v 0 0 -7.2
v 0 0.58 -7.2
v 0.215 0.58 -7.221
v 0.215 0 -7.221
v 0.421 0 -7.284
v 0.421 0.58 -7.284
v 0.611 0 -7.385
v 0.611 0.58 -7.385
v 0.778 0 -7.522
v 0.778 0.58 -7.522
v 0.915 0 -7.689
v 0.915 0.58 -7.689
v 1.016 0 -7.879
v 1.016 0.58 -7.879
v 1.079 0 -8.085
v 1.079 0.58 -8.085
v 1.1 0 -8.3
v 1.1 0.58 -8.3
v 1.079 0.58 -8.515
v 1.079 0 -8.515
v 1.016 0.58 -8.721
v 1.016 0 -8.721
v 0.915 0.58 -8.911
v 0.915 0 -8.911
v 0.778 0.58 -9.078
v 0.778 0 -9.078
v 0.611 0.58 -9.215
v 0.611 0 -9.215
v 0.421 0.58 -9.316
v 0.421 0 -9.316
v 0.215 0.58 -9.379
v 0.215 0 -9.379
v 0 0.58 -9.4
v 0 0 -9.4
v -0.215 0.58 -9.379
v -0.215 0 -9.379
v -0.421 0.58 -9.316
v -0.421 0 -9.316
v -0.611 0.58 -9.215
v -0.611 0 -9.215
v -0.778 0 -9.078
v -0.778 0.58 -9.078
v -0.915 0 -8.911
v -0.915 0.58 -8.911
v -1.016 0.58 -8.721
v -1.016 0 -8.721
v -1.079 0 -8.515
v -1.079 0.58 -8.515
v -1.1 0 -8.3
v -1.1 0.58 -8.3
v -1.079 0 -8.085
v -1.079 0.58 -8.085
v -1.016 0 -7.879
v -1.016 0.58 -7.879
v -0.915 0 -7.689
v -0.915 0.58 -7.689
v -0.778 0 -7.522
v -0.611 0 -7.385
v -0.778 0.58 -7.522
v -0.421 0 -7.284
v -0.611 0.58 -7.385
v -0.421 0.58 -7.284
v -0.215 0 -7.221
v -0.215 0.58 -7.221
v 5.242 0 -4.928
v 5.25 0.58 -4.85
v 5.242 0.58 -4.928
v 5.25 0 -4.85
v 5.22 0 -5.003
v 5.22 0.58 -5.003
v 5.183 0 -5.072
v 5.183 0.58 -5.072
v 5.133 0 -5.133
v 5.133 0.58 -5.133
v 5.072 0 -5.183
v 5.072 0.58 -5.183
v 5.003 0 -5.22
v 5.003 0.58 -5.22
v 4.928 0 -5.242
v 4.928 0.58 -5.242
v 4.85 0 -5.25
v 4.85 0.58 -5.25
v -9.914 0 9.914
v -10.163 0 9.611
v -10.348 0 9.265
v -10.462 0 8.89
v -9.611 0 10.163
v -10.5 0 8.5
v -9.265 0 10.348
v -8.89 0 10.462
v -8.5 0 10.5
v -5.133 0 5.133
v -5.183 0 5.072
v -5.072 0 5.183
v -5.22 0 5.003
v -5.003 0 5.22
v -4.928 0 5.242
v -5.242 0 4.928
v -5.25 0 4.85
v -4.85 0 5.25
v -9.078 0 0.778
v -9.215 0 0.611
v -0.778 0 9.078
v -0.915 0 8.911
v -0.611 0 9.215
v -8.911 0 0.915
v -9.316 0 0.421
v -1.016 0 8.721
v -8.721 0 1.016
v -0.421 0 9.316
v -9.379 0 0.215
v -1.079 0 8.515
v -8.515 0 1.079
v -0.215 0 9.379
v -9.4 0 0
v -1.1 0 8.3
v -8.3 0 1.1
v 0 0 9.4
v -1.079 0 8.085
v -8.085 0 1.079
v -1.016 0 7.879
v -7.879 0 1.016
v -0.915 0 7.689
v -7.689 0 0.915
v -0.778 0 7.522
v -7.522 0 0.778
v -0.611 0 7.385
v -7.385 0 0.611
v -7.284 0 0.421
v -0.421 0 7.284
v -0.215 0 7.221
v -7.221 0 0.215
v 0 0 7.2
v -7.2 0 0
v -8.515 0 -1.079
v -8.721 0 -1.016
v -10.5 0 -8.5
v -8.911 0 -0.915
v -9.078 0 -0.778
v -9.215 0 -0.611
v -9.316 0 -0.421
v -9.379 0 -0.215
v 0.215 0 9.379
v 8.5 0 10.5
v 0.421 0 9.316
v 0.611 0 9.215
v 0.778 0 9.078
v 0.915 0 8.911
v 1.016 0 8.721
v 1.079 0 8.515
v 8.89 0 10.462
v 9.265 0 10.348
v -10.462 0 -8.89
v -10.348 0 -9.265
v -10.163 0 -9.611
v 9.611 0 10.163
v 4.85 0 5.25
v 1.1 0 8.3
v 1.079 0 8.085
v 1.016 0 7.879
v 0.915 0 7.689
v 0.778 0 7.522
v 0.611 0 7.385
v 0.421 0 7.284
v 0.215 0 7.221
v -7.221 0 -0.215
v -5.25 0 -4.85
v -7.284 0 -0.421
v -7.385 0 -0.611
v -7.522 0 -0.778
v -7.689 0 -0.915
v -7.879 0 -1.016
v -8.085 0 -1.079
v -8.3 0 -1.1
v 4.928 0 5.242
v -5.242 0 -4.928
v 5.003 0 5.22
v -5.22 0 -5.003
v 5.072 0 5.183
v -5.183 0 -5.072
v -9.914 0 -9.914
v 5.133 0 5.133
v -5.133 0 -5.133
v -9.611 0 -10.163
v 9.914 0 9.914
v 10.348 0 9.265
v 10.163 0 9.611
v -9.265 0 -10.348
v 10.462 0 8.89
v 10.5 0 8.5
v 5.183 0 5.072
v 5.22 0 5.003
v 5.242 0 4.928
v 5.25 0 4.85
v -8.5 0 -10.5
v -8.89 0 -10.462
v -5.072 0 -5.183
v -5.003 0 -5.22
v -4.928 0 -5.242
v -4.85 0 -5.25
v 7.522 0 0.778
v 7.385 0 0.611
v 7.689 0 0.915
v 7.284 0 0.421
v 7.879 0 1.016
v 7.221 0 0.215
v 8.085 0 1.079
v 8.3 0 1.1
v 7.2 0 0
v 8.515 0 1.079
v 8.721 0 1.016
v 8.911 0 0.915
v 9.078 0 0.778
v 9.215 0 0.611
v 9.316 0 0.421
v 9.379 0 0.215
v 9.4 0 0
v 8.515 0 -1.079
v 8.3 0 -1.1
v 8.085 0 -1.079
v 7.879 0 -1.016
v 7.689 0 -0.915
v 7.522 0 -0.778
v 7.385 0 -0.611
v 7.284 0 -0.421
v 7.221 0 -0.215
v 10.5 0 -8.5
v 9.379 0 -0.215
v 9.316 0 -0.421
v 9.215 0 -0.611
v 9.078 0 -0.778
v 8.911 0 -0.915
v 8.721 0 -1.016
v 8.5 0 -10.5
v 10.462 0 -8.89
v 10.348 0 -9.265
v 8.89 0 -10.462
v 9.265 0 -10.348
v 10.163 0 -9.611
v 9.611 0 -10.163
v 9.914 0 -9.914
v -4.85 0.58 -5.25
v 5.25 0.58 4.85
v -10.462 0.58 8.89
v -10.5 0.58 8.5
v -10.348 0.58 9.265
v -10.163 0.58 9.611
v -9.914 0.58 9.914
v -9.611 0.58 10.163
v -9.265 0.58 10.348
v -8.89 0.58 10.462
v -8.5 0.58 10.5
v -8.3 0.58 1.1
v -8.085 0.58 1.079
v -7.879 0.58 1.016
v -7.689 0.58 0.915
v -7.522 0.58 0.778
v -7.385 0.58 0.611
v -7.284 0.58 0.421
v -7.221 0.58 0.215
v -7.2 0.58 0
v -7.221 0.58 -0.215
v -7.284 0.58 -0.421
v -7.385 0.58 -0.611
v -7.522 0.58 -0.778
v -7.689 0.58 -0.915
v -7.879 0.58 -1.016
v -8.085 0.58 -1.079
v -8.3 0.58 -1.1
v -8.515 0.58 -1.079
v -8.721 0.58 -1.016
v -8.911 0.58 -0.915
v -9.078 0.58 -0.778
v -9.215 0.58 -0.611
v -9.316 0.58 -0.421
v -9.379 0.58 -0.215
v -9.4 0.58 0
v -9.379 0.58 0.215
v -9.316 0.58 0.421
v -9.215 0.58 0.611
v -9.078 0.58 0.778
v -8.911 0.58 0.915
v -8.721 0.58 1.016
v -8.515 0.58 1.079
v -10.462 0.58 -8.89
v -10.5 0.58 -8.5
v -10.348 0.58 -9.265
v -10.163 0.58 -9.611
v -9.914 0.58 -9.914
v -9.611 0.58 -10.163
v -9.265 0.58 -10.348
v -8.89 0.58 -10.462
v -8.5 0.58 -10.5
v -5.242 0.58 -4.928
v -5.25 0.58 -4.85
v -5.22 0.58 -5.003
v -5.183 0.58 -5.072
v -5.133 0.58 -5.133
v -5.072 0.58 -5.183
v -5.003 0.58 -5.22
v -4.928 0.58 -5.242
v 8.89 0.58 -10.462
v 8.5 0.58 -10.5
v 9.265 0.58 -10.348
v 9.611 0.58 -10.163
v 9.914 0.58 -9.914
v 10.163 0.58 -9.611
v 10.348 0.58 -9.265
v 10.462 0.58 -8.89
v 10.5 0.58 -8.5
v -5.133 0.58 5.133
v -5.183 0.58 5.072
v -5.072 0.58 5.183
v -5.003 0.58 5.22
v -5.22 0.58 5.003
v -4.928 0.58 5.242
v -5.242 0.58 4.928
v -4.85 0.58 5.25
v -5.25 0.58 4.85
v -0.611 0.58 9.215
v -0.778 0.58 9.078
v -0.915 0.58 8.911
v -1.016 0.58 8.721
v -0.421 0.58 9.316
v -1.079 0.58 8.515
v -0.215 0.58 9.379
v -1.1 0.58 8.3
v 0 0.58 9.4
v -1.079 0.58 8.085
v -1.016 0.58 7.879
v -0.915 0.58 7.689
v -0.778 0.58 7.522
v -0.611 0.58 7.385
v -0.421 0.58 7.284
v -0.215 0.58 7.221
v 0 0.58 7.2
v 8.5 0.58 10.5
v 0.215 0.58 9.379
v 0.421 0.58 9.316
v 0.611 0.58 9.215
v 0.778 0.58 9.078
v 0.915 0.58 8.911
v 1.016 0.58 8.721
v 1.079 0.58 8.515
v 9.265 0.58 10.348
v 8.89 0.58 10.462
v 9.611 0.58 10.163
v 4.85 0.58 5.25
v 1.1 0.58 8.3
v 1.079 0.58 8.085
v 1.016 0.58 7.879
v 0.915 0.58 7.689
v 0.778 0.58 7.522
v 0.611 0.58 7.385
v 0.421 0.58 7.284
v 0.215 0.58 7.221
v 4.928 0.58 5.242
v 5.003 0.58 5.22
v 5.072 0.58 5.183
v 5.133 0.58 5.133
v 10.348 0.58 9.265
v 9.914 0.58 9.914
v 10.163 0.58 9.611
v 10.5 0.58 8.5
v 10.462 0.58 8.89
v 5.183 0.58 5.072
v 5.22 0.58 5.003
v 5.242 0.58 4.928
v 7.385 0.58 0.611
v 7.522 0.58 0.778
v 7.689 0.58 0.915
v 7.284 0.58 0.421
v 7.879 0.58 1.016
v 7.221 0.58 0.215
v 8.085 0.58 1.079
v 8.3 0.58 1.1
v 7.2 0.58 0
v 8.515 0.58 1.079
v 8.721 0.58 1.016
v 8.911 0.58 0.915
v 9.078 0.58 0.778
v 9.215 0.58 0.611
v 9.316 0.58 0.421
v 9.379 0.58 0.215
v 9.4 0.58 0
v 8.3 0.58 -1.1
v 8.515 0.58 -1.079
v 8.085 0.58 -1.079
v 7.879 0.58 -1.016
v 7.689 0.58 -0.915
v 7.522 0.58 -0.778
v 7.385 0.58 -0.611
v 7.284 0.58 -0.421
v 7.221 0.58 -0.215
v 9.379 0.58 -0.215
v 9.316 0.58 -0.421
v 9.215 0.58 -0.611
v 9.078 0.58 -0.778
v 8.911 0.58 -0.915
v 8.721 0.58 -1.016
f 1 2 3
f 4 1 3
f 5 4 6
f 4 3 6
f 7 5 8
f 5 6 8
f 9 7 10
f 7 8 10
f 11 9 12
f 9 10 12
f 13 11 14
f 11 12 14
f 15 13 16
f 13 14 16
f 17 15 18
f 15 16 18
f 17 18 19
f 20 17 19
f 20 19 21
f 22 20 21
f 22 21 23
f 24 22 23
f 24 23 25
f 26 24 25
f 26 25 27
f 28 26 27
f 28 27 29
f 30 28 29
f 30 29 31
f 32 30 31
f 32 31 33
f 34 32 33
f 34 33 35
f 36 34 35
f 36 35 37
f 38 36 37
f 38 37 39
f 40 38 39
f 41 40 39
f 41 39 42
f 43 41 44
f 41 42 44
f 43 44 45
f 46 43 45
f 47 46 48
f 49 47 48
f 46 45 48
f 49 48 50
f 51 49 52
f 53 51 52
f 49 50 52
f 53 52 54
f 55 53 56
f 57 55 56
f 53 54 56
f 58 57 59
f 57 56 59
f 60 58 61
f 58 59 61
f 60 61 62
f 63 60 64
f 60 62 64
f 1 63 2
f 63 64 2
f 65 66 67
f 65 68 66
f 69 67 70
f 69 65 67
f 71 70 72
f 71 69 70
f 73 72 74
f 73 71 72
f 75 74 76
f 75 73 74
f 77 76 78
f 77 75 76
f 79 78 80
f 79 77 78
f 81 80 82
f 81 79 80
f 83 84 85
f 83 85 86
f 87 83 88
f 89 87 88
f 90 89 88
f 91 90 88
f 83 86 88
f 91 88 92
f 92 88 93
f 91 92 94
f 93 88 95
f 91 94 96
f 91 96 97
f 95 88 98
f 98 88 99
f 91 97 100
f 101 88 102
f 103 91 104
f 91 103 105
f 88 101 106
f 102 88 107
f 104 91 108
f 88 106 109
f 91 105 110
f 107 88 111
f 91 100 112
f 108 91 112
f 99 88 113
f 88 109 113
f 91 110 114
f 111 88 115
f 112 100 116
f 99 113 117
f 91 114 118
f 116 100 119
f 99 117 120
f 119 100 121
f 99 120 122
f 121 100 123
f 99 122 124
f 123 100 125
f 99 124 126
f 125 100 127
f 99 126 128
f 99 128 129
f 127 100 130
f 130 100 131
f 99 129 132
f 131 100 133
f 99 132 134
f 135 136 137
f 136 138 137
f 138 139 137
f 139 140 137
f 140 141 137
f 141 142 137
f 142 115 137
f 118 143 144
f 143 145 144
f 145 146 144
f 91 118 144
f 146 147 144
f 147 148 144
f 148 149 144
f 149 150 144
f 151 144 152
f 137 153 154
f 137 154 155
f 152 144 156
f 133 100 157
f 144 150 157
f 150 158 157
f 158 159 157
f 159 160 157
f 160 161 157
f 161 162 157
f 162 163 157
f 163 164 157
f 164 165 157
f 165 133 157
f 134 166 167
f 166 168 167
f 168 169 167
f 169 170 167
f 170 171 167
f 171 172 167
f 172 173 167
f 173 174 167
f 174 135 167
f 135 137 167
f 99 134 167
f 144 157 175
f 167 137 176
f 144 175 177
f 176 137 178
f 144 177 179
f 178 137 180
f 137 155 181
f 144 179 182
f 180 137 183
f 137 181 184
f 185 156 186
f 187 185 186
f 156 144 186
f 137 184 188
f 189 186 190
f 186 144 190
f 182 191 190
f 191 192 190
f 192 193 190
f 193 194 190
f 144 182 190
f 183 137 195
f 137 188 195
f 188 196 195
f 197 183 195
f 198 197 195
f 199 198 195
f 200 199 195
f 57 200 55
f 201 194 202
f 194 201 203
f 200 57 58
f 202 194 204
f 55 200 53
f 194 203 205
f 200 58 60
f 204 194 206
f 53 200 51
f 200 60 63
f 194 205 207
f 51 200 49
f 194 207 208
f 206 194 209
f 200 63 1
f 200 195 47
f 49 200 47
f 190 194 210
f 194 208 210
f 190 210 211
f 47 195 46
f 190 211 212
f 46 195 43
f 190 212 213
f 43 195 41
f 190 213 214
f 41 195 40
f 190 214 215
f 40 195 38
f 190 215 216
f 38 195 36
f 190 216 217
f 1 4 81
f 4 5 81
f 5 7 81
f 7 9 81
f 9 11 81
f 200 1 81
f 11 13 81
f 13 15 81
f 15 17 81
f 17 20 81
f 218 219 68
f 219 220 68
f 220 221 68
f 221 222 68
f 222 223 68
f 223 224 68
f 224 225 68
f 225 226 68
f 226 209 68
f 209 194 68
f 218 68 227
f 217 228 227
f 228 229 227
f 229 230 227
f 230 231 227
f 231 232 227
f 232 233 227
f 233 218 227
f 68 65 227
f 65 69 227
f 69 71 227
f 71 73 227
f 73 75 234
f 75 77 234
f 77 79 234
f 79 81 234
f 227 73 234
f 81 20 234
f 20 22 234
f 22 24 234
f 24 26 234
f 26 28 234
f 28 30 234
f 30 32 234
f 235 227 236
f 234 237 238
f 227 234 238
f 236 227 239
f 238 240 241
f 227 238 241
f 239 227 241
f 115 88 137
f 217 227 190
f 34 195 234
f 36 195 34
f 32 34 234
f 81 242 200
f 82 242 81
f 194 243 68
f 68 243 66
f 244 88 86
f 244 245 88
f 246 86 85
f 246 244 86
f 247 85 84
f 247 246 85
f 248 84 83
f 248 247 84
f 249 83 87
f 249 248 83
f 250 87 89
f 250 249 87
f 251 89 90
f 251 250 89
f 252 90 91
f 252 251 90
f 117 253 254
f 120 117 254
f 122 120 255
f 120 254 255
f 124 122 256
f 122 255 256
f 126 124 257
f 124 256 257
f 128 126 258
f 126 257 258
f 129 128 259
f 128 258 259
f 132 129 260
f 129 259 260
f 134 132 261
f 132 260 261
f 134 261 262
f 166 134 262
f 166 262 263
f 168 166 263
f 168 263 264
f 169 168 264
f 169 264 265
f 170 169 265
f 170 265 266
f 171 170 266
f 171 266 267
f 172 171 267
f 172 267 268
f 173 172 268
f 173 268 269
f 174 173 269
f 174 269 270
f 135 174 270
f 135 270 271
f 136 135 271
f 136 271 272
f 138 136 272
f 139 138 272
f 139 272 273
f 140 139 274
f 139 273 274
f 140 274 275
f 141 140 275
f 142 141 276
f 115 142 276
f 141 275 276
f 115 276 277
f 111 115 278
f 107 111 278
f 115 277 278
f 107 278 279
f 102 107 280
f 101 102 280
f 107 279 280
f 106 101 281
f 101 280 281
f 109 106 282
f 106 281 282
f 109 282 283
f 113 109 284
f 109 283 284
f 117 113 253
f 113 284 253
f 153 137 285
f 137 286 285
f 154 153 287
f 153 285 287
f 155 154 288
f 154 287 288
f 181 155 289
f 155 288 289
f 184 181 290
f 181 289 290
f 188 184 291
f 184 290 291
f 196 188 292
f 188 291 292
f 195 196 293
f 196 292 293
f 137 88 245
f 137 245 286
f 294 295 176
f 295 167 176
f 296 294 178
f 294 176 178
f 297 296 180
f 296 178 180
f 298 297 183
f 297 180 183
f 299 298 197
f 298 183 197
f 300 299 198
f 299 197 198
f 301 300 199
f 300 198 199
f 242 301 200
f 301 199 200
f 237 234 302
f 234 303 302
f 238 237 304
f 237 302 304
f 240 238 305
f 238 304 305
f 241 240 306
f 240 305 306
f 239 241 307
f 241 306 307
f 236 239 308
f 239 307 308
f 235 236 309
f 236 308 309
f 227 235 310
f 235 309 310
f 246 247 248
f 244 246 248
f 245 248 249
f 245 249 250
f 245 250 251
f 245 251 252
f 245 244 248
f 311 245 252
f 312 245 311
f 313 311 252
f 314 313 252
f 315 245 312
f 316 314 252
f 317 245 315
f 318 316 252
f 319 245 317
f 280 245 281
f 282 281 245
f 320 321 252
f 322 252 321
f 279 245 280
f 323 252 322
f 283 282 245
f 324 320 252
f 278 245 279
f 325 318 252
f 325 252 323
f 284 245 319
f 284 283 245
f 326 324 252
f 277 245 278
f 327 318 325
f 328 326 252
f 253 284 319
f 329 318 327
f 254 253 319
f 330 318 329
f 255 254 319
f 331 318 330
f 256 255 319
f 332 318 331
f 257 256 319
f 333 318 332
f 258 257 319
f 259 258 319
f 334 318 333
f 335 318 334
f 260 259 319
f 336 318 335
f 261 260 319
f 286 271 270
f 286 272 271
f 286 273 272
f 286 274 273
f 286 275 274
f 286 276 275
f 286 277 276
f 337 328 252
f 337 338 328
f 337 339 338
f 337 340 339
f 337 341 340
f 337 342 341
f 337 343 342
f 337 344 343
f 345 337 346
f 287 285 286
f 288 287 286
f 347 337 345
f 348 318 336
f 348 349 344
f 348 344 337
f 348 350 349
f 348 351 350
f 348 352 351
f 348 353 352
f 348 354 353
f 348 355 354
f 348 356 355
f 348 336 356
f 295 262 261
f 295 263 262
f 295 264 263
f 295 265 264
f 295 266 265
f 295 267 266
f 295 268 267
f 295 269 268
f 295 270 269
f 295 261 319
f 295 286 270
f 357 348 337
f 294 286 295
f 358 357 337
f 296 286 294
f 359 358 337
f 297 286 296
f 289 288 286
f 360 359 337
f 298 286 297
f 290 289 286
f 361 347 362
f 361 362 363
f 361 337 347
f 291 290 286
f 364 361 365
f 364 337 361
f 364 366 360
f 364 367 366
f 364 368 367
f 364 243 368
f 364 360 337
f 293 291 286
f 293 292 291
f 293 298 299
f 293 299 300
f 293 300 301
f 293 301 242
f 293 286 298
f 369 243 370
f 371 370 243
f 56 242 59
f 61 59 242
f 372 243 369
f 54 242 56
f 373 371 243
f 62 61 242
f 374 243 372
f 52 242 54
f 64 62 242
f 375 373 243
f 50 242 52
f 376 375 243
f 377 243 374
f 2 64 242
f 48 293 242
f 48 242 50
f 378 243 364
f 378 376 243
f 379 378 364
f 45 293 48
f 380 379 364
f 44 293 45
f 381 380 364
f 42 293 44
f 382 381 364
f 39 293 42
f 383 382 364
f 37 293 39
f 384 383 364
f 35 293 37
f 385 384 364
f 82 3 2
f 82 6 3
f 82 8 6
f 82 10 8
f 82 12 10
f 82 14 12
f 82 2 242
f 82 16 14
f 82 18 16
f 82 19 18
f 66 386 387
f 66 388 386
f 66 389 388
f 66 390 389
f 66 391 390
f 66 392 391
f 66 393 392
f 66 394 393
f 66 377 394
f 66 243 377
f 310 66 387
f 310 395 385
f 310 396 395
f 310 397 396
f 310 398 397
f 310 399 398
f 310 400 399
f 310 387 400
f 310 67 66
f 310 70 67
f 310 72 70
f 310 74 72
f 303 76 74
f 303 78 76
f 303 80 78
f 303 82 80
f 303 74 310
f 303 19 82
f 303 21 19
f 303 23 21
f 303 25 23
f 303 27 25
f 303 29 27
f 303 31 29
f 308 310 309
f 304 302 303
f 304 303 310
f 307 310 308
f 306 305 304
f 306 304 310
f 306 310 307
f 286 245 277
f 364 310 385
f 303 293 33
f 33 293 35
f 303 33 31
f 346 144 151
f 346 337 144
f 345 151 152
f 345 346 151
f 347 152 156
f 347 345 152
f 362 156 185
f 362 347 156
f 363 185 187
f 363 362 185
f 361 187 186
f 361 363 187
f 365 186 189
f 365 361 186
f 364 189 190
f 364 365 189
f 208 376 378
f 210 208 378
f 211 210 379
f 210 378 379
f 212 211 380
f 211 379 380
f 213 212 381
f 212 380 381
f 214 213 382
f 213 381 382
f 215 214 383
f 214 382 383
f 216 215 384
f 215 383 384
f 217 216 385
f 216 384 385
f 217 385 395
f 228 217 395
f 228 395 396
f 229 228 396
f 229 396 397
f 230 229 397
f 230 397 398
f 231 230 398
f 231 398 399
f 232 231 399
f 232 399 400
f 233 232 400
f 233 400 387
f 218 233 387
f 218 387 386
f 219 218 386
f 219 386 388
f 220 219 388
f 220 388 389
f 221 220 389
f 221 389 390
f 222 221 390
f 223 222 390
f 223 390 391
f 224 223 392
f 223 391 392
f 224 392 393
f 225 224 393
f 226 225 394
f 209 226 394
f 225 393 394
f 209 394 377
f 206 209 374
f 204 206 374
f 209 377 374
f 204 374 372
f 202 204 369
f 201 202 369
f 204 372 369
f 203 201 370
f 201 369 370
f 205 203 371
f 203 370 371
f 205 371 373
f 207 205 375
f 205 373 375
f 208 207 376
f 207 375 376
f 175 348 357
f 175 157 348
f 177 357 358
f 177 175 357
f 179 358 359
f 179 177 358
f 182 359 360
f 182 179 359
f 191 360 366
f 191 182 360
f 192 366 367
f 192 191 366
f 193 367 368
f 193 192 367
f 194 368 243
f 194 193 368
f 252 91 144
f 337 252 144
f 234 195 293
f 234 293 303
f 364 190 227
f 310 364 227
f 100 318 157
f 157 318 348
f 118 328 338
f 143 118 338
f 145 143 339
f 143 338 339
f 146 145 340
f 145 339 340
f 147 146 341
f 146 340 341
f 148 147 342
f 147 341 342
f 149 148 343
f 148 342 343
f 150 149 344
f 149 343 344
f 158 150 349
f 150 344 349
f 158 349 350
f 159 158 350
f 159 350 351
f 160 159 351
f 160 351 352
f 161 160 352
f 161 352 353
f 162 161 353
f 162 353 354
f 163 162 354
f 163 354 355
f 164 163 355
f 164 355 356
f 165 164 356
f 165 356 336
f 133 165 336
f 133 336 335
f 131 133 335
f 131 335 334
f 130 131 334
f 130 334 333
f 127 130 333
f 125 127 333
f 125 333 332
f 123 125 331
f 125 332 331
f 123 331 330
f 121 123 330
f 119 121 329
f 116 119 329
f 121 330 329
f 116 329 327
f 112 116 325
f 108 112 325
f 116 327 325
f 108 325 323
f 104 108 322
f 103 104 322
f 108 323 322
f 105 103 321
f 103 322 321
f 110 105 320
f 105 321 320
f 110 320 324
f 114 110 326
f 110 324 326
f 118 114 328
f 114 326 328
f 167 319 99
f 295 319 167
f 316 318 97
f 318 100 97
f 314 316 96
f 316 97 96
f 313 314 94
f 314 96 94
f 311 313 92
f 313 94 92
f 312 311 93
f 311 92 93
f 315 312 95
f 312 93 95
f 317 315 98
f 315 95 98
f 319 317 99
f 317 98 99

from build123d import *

# Parameters (mm, degrees)
SKETCH1_W           = 21
SKETCH1_H           = 21
BOSS_EXTRUDE1_DEPTH = 0.58
SKETCH2_W           = 10.5
SKETCH2_H           = 10.5
CUT_EXTRUDE1_DEPTH  = 15.860565265
FILLET1_R           = 2
SKETCH5_R           = 1.1
CUT_EXTRUDE5_DEPTH  = 15.860565265
FILLET2_R           = 0.4


with BuildPart() as part:
    # Sketch1 → Boss-Extrude1 (new body)
    with BuildSketch(Plane(origin=(0, 0, 0), x_dir=(1, 0, 0), z_dir=(0, 1, 0))):
        Rectangle(SKETCH1_W, SKETCH1_H)
    extrude(amount=BOSS_EXTRUDE1_DEPTH)

    # Sketch2 → Cut-Extrude1 (cut, through all)
    with BuildSketch(Plane(origin=(0, 0.58, 0), x_dir=(1, 0, 0), z_dir=(0, 1, 0))):
        Rectangle(SKETCH2_W, SKETCH2_H)
    extrude(amount=-CUT_EXTRUDE1_DEPTH, mode=Mode.SUBTRACT)

    # Fillet1
    fillet1_edges = [part.edges().sort_by_distance(p)[0] for p in [
        (10.5, 0.29, 10.5),
        (-10.5, 0.29, 10.5),
        (-10.5, 0.29, -10.5),
        (10.5, 0.29, -10.5),
    ]]
    fillet(fillet1_edges, radius=FILLET1_R)

    # Sketch5 → Cut-Extrude5 (cut, through all)
    with BuildSketch(Plane(origin=(0, 0.58, 0), x_dir=(1, 0, 0), z_dir=(0, 1, 0))):
        with Locations(Location((0, 8.3, 0), (0, 0, 270))):
            Circle(SKETCH5_R)
        with Locations(Location((8.3, 0, 0), (0, 0, 270))):
            Circle(SKETCH5_R)
        with Locations(Location((0, -8.3, 0), (0, 0, 270))):
            Circle(SKETCH5_R)
        with Locations(Location((-8.3, 0, 0), (0, 0, 270))):
            Circle(SKETCH5_R)
    extrude(amount=-CUT_EXTRUDE5_DEPTH, mode=Mode.SUBTRACT)

    # Fillet2
    fillet2_edges = [part.edges().sort_by_distance(p)[0] for p in [
        (5.25, 0.29, -5.25),
        (5.25, 0.29, 5.25),
        (-5.25, 0.29, 5.25),
        (-5.25, 0.29, -5.25),
    ]]
    fillet(fillet2_edges, radius=FILLET2_R)


solid = part.part
